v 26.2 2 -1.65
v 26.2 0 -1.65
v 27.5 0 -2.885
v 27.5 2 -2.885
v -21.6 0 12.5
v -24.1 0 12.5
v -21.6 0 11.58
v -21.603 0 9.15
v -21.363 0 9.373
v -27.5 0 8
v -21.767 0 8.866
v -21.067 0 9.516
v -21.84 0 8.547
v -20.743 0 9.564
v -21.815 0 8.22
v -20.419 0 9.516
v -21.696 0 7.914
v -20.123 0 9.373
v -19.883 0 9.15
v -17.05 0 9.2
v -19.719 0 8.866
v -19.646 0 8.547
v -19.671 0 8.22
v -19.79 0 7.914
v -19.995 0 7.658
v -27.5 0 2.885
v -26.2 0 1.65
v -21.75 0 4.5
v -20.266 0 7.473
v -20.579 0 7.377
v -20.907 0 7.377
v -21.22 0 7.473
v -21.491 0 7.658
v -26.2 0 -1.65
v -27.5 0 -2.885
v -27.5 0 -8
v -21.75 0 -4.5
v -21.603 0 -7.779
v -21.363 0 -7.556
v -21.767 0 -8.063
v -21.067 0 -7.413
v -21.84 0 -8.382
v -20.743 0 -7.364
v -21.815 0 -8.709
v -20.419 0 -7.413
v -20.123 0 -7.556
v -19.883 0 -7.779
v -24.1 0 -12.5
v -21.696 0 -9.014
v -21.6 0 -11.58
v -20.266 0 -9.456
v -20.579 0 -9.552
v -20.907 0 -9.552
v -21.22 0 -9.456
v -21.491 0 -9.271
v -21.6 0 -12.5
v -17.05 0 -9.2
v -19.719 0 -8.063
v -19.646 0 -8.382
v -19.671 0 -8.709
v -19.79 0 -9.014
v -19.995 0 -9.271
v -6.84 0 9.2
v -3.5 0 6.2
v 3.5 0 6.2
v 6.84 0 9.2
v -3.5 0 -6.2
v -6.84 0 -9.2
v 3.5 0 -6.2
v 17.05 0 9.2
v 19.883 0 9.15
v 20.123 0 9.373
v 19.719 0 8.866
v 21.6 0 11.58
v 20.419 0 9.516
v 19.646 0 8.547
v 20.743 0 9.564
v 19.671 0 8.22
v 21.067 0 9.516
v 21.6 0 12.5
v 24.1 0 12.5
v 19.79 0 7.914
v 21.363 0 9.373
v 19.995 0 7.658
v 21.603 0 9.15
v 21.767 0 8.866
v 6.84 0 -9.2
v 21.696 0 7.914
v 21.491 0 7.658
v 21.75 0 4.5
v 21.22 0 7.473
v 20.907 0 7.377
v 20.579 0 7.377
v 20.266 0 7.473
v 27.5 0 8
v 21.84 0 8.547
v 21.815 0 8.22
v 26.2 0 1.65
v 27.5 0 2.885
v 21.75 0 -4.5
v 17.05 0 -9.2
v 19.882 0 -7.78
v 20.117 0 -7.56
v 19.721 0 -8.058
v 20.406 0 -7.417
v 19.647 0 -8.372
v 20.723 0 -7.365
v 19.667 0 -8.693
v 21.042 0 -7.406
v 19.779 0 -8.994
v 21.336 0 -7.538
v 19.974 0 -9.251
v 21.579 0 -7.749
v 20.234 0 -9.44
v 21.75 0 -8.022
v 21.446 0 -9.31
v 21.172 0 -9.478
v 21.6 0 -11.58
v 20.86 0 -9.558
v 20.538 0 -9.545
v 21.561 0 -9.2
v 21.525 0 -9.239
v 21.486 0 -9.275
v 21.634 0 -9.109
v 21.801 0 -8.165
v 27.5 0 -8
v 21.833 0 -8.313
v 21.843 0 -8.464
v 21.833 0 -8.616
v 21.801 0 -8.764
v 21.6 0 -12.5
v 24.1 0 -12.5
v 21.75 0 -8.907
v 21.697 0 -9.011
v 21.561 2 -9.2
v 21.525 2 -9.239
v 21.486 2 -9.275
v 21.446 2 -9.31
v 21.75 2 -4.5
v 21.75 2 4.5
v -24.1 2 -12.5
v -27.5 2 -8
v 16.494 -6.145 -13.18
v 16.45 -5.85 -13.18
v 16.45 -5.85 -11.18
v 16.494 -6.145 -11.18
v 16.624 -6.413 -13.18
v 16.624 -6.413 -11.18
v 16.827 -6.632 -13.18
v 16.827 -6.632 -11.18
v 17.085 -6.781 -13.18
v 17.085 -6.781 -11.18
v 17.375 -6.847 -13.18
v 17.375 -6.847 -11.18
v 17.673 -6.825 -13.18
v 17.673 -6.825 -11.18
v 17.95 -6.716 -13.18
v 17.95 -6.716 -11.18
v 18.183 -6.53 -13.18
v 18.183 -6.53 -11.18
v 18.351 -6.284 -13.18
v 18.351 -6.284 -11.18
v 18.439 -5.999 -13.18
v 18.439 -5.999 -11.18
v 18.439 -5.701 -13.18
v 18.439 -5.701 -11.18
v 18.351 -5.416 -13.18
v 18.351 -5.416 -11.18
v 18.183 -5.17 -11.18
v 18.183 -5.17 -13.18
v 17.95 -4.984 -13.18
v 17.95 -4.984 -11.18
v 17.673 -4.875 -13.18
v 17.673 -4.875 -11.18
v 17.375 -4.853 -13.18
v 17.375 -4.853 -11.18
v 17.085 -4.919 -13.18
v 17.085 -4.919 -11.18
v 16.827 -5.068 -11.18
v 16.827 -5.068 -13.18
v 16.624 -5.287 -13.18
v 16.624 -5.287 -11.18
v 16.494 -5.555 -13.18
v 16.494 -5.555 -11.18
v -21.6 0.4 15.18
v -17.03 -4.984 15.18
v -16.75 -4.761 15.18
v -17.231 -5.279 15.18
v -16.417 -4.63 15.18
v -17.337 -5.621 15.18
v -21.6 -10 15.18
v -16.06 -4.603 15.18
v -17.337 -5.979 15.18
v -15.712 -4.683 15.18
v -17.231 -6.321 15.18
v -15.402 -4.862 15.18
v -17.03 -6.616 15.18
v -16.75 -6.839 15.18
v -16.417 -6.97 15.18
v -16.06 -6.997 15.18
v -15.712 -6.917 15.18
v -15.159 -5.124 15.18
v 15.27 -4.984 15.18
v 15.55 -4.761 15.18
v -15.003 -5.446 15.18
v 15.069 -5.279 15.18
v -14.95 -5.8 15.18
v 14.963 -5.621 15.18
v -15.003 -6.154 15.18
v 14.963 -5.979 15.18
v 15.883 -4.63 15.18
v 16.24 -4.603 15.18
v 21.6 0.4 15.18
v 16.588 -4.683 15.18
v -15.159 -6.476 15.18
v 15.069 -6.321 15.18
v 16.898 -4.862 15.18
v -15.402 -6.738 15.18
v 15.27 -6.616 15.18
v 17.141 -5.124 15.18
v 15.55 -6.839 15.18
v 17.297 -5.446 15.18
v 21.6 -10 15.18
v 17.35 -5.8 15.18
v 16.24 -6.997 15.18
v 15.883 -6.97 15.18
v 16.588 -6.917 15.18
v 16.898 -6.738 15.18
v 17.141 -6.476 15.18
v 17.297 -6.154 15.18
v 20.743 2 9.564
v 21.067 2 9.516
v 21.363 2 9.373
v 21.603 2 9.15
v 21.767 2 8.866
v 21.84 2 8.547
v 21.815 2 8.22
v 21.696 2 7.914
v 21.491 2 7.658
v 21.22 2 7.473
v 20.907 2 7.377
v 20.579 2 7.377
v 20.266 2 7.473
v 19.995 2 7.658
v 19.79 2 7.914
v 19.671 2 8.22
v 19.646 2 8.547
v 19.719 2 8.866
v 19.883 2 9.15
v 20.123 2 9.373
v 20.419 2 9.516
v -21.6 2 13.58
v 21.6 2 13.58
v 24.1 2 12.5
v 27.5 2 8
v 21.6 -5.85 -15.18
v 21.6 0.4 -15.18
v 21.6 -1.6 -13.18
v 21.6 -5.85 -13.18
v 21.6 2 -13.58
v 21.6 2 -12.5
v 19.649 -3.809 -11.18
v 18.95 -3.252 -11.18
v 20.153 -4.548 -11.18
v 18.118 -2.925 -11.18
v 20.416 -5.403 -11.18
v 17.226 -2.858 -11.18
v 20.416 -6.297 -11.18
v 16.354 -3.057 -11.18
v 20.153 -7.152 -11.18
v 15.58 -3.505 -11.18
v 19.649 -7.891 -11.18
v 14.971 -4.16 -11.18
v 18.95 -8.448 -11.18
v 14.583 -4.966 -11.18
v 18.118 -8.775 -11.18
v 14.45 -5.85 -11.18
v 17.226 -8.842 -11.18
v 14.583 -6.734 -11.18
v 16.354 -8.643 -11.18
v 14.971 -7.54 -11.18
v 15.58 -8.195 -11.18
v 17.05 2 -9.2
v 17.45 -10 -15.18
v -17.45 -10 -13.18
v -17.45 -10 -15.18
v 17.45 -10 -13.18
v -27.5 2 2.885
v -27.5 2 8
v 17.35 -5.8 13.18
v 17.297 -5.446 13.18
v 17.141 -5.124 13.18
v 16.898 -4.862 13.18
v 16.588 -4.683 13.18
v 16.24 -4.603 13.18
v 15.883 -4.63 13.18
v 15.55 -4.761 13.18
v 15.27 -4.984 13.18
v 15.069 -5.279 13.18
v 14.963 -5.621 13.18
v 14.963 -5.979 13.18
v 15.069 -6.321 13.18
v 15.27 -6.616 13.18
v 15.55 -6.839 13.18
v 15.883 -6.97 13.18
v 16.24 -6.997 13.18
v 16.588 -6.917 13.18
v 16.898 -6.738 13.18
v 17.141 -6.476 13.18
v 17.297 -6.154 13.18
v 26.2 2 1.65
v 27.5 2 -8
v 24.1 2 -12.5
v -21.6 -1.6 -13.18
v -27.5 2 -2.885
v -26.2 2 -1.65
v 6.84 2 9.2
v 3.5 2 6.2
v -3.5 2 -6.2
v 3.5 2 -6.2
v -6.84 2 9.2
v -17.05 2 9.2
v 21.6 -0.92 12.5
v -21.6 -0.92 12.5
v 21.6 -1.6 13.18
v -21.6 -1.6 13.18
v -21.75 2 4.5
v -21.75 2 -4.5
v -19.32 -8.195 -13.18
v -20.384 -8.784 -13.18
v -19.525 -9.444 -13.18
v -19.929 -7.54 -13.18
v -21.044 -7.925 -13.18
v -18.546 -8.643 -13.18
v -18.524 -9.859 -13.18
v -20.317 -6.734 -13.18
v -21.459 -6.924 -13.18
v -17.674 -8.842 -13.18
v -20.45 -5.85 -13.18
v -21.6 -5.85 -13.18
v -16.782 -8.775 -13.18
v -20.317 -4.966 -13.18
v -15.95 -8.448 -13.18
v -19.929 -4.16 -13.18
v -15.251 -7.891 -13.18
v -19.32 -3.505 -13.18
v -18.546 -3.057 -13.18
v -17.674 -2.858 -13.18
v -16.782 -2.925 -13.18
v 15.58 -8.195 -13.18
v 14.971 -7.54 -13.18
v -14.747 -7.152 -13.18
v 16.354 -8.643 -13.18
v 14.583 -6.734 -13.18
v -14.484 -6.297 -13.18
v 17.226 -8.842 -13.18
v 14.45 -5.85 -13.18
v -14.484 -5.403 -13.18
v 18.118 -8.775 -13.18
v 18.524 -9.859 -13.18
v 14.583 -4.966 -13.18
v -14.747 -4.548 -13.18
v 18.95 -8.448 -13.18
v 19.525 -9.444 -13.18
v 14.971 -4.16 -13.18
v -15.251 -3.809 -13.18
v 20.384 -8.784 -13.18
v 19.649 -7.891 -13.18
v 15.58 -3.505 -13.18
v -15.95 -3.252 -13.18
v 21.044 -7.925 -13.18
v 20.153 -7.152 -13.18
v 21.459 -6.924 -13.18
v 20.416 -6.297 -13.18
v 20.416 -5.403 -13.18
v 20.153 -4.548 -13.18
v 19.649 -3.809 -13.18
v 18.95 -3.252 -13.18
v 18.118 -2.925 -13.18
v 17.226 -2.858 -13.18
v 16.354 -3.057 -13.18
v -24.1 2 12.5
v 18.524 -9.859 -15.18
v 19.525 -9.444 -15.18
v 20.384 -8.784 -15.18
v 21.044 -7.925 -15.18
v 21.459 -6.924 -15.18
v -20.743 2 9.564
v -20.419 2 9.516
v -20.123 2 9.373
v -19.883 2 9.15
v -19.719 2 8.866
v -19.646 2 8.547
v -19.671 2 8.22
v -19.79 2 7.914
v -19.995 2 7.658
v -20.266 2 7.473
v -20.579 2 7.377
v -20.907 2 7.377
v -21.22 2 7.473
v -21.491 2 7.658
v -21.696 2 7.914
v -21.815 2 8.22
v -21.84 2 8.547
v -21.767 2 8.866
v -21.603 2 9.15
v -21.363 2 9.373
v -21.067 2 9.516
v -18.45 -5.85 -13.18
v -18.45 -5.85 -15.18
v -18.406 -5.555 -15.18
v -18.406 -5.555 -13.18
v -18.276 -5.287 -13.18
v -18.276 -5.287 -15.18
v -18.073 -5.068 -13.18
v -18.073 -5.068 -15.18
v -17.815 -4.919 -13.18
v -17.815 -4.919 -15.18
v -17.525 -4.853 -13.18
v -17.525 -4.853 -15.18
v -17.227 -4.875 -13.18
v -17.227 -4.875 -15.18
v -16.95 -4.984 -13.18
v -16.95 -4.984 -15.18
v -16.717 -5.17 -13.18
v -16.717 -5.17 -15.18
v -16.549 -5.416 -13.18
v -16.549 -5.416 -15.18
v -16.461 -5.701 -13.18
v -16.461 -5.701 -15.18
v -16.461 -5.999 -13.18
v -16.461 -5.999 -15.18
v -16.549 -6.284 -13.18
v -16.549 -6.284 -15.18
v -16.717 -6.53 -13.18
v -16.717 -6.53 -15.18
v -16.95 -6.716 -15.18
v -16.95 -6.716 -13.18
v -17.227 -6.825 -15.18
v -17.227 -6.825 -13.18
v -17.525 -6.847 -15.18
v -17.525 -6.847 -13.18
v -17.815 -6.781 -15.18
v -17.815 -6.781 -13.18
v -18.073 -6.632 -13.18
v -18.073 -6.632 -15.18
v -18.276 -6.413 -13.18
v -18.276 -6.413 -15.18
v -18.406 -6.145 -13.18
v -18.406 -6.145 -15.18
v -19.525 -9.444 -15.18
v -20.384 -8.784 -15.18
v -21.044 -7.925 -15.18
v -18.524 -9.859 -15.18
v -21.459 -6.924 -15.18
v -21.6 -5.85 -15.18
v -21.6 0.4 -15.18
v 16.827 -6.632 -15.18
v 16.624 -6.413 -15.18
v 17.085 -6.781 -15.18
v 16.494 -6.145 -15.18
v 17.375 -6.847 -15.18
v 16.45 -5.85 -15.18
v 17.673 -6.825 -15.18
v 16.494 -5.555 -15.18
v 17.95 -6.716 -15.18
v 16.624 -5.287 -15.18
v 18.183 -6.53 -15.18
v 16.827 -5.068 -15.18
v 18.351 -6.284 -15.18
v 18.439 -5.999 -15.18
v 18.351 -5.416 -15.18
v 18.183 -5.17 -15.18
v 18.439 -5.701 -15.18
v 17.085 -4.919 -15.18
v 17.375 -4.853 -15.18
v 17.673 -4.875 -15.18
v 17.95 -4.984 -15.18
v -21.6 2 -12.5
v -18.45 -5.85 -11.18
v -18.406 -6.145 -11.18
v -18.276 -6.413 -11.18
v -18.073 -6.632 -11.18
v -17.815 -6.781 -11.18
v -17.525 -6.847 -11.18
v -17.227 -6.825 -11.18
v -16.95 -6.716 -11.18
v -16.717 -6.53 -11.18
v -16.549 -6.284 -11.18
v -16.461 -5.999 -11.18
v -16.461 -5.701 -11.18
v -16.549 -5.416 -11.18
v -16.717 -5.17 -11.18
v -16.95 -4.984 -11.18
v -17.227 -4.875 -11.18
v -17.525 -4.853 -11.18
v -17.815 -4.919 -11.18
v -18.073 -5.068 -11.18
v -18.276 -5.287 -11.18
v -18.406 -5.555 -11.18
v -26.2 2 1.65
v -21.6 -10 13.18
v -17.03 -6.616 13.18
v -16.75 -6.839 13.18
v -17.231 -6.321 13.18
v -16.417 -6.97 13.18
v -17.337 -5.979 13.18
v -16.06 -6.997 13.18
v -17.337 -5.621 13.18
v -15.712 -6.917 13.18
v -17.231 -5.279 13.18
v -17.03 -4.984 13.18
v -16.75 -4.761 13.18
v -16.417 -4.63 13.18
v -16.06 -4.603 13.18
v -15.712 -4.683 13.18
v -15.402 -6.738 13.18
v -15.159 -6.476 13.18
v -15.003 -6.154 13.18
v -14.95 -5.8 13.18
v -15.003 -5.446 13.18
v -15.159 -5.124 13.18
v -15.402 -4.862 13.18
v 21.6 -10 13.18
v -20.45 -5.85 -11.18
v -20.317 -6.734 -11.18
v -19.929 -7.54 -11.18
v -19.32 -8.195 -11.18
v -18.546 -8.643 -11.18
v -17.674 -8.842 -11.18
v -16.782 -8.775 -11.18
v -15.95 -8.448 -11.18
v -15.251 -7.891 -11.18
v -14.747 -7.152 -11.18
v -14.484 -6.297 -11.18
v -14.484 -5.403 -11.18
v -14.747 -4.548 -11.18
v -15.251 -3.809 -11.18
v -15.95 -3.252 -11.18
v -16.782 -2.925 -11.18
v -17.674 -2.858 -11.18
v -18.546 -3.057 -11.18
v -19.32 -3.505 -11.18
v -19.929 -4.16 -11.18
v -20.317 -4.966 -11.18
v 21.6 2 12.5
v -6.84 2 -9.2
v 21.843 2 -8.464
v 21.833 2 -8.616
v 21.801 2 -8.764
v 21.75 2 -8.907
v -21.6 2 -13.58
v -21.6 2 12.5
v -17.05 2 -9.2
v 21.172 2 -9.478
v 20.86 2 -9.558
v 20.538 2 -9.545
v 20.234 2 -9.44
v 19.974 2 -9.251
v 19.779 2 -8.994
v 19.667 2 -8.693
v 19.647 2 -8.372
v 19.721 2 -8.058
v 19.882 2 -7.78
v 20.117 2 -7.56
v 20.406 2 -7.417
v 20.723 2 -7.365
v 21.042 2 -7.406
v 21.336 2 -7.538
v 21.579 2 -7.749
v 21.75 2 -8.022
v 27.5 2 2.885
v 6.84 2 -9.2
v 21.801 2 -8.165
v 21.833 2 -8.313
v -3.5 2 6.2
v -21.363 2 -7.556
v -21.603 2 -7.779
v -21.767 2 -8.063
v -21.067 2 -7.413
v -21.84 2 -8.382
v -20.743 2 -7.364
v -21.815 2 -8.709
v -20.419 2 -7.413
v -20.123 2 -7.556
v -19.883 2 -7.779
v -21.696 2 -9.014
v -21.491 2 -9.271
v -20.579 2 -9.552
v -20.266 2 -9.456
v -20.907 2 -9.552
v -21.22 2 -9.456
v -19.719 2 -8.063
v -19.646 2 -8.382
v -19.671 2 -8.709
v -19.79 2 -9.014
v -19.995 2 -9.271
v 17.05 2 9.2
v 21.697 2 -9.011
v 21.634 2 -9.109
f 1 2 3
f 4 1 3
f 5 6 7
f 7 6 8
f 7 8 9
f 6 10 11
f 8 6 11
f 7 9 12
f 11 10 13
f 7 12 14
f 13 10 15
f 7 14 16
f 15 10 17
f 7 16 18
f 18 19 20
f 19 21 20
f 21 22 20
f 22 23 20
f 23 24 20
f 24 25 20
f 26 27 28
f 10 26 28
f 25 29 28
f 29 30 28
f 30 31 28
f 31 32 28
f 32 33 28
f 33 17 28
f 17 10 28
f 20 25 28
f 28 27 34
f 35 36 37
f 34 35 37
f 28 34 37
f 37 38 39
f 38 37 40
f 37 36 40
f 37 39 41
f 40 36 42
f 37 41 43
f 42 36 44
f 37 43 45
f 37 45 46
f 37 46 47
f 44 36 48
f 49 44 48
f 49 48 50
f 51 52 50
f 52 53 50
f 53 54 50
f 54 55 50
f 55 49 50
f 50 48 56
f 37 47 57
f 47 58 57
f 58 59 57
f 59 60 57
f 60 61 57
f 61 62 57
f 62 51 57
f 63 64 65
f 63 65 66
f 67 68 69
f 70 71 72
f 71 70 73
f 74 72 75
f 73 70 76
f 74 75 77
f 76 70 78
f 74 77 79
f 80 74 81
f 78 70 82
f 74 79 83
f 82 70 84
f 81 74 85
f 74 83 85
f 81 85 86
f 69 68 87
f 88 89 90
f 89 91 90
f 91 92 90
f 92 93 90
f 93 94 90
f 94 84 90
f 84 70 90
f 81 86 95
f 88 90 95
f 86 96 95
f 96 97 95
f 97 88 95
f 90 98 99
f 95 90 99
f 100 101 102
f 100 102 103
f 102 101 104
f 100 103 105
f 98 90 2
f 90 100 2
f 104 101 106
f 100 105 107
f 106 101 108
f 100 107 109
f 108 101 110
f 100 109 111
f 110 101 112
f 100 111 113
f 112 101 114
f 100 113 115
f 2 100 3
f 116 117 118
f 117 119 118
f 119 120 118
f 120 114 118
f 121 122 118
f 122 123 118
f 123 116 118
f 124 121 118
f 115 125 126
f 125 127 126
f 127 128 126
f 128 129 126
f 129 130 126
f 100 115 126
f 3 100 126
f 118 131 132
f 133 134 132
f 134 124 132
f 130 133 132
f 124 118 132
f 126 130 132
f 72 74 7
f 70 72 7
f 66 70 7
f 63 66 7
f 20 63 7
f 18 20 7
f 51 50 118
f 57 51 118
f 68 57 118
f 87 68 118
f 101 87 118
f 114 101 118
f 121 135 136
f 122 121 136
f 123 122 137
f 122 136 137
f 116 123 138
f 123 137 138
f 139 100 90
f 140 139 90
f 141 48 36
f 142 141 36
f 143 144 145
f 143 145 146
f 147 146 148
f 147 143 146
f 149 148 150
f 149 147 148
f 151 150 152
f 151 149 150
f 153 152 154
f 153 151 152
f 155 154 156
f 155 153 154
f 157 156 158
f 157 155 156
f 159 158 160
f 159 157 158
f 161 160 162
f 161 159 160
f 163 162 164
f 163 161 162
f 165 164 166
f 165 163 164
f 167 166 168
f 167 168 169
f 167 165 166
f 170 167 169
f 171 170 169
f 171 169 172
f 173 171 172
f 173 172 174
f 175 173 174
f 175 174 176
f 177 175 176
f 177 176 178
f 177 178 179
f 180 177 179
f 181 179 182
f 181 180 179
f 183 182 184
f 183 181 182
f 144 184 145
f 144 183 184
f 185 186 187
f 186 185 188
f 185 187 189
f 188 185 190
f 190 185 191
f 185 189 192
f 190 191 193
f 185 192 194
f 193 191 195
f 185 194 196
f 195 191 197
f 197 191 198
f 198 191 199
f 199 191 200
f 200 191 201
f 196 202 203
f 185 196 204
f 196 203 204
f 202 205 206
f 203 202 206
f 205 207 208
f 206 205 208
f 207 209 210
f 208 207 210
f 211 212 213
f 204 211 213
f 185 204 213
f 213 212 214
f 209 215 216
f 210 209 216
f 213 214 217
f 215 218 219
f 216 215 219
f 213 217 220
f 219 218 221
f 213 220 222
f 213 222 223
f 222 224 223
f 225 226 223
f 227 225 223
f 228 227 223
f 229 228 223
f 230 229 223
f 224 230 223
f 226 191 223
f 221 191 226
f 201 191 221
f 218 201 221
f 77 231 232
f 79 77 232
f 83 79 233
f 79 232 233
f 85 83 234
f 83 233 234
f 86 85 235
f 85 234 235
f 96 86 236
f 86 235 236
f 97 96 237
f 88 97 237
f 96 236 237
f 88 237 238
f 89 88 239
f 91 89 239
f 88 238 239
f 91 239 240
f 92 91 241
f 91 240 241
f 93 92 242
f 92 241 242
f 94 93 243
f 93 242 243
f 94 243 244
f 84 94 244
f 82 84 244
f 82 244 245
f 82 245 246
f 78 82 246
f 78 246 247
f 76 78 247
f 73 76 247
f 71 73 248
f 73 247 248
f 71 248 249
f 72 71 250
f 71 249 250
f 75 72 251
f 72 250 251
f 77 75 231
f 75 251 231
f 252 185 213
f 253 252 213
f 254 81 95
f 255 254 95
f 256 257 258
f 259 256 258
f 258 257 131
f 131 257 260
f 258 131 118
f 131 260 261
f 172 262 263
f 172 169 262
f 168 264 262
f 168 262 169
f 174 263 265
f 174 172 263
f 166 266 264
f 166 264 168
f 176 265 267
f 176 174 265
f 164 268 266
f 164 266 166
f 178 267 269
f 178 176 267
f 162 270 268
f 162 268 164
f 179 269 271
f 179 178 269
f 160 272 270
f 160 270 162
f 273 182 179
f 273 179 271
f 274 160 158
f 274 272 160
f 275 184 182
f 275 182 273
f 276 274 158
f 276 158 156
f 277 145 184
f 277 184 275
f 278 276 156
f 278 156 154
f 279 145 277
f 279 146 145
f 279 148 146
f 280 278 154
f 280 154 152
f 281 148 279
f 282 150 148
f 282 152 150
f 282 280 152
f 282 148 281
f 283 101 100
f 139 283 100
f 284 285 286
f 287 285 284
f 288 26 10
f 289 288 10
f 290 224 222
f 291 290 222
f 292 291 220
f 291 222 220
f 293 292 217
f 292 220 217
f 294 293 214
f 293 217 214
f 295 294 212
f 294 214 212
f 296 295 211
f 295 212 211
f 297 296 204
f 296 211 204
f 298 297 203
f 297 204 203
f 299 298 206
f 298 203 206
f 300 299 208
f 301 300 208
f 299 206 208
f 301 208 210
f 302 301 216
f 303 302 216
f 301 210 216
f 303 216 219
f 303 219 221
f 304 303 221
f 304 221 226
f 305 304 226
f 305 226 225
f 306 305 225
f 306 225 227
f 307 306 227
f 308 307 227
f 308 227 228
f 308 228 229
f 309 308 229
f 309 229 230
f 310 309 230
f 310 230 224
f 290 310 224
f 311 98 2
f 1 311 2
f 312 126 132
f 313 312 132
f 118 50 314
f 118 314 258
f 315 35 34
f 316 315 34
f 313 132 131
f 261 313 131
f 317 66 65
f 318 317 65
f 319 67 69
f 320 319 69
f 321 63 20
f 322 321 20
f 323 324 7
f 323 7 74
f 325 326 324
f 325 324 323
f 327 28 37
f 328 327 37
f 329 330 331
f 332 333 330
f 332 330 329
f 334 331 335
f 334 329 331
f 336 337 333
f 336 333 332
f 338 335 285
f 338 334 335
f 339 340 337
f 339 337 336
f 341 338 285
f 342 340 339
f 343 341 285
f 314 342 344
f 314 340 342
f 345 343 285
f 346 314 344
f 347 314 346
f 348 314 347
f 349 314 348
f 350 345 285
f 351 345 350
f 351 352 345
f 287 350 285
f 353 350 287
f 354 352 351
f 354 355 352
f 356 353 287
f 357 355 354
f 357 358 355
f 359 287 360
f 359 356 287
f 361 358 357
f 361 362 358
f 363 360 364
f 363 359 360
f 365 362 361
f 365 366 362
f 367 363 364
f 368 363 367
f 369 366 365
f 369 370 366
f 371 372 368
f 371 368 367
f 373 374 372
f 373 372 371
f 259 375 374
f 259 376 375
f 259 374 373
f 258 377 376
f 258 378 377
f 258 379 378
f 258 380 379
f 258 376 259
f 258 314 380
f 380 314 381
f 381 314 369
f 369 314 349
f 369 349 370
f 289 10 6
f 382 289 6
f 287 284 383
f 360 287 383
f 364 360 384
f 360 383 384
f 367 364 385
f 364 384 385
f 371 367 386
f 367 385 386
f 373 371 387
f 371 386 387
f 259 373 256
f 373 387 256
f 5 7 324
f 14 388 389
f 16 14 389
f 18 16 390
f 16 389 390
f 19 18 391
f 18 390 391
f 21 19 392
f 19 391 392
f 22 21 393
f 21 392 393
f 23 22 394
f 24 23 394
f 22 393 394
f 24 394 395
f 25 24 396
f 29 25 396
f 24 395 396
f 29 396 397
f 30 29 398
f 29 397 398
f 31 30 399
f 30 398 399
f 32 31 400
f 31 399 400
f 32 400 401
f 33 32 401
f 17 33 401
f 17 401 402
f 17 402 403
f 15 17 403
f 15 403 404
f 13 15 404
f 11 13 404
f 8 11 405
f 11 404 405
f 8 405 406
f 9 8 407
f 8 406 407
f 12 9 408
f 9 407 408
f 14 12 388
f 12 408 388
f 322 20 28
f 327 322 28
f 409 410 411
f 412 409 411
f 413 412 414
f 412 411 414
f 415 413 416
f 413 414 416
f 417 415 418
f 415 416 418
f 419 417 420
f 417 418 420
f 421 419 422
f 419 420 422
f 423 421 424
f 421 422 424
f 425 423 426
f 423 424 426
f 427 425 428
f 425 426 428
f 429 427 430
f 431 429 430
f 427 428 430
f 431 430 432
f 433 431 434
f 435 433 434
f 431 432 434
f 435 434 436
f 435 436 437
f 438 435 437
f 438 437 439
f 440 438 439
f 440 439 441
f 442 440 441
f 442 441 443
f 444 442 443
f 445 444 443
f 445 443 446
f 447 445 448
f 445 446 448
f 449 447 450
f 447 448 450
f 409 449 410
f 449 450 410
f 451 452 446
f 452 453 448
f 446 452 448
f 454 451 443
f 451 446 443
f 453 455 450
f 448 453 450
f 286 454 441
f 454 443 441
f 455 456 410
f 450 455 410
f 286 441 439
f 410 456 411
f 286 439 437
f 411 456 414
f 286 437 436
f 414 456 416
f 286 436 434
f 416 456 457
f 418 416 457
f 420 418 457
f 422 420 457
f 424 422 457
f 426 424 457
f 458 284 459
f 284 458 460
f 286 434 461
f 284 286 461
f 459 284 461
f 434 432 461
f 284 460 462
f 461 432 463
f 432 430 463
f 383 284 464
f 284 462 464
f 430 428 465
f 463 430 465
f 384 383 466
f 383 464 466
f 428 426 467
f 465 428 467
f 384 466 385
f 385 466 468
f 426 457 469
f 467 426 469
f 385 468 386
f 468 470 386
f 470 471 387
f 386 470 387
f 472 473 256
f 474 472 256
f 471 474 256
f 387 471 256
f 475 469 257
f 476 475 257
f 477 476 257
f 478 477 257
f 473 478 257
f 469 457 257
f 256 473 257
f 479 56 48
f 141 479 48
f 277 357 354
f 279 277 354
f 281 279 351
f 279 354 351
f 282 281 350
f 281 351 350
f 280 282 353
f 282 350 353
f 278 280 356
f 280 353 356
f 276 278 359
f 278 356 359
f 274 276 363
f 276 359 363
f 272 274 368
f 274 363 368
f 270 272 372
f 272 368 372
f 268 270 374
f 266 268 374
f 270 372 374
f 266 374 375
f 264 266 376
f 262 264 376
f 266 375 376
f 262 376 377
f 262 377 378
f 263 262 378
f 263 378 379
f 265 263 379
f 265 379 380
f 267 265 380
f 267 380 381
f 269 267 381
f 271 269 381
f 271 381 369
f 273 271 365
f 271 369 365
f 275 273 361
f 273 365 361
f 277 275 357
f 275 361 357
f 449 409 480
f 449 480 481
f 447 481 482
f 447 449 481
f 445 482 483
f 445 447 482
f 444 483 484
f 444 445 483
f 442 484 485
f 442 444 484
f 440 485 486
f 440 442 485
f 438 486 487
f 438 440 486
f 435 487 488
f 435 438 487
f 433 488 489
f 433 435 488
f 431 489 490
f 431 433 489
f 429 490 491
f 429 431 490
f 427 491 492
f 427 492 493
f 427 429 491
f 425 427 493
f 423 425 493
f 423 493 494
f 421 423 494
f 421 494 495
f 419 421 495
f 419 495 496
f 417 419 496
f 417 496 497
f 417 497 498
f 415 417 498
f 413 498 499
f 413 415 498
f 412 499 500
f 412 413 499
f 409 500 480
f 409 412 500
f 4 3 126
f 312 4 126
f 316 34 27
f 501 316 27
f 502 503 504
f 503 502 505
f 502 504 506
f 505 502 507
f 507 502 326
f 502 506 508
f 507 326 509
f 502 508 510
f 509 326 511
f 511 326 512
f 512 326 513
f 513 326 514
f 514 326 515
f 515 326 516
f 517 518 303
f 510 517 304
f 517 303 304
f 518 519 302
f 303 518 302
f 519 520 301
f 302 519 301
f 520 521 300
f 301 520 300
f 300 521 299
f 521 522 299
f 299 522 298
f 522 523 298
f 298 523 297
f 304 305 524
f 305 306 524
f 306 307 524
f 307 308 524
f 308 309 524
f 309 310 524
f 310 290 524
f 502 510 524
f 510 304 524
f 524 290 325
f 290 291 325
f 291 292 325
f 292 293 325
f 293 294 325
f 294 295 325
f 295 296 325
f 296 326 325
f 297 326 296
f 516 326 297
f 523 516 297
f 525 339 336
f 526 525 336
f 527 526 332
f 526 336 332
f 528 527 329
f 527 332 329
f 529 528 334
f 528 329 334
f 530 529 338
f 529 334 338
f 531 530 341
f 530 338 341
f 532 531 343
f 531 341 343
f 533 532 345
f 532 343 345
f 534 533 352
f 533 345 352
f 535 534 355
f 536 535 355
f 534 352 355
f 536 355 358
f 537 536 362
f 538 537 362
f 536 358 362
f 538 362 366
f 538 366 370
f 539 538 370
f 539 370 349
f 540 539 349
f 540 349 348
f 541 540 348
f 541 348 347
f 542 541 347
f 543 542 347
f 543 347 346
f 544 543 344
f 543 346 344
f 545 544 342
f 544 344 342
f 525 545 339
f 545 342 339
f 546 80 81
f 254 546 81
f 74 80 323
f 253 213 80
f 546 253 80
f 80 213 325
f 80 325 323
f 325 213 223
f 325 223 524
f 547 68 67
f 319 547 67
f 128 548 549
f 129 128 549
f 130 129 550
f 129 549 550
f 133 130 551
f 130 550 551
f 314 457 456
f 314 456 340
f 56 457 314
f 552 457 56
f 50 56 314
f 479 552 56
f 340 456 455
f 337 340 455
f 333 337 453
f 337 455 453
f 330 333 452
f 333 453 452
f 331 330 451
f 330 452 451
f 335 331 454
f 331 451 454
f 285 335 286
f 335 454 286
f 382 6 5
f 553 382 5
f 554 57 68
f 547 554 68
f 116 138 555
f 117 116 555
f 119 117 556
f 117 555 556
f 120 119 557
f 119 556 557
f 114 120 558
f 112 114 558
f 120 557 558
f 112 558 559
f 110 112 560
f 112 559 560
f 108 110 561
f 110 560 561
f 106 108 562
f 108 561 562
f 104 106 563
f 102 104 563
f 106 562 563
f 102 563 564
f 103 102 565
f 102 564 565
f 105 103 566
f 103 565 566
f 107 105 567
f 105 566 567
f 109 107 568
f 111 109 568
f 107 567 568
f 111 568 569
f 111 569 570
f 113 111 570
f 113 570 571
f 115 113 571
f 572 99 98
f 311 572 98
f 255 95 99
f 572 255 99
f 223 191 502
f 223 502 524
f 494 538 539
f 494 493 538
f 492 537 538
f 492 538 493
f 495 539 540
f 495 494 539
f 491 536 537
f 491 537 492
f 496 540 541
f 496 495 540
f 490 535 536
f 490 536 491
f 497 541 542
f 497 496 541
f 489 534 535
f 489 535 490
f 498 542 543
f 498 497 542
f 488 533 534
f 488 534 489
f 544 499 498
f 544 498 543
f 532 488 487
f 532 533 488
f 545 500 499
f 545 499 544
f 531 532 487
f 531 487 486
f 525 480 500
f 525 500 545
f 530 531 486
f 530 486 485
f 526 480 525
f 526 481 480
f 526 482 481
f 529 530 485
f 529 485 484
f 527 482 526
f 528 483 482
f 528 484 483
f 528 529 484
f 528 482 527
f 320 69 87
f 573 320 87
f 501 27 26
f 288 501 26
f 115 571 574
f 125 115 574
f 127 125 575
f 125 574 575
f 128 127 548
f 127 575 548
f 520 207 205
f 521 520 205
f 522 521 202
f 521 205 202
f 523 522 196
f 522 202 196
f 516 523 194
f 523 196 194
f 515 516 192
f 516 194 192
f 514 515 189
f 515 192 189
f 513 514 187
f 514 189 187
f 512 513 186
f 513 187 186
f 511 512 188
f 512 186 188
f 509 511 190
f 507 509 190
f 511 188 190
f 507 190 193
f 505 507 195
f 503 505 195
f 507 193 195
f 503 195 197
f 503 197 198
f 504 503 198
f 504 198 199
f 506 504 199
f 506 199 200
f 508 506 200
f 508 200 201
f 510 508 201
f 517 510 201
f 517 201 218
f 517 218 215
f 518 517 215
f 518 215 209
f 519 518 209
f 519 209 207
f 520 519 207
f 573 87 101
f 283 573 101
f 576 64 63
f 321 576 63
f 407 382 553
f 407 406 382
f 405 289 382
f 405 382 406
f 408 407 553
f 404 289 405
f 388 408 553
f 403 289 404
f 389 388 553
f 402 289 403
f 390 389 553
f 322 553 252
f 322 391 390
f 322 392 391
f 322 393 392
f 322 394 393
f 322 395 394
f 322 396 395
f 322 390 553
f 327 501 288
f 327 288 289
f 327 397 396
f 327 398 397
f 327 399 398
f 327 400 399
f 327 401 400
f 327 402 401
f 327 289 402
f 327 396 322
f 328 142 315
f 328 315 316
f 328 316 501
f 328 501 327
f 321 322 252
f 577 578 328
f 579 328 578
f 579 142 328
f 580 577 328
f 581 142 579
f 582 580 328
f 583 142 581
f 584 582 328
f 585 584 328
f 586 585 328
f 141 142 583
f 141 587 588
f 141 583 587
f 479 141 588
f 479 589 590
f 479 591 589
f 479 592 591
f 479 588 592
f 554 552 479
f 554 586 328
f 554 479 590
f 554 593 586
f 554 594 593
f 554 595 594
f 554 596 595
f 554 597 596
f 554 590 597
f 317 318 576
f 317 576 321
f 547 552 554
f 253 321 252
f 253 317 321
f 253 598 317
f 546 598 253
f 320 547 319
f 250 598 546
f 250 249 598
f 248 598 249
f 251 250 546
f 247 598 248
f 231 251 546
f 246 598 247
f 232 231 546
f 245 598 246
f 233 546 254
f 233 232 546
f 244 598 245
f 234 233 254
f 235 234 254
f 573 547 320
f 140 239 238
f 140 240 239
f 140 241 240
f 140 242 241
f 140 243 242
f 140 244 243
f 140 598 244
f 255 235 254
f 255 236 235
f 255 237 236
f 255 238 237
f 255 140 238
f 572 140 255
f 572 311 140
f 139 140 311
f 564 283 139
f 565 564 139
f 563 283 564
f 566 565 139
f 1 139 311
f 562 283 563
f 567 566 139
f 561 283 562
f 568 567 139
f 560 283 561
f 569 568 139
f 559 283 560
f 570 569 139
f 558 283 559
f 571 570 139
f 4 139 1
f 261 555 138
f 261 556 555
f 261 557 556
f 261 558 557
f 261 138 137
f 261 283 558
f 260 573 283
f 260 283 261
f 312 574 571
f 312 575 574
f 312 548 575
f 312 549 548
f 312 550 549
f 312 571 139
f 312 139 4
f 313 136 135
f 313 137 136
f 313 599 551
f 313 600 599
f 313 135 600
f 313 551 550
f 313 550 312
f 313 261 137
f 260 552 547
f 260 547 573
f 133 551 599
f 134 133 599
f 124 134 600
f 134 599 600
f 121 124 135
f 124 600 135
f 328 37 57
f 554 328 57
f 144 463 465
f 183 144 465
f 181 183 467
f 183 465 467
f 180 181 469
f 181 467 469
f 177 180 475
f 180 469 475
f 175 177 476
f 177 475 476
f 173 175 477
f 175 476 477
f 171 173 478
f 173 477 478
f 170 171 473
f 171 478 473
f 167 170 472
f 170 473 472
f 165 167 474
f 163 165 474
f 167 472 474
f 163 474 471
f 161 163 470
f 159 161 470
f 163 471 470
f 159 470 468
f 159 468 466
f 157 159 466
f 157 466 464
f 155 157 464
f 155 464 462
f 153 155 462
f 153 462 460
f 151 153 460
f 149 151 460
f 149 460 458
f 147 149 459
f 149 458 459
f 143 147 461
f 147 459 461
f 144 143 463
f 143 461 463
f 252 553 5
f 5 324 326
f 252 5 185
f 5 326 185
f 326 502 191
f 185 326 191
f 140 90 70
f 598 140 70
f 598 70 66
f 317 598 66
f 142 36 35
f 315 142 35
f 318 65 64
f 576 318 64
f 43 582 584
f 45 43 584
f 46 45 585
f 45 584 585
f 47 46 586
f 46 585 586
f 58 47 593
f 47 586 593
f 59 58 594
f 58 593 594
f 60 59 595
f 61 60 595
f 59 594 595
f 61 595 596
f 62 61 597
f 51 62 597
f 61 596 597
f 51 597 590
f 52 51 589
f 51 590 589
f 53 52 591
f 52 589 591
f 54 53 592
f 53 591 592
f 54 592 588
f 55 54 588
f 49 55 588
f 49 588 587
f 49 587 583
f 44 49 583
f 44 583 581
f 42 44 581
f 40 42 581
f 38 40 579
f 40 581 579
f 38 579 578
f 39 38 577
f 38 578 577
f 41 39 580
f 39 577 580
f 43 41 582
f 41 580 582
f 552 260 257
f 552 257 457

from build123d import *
from build123d.topology import SkipClean

# Parameters (mm, degrees)
EXTRUDE_1_DEPTH     = 2
SKETCH_2_R          = 1.1
CUT_EXTRUDE_1_DEPTH = 2
SKETCH_3_W          = 43.2
SKETCH_3_H          = 2
EXTRUDE_2_DEPTH     = 10
SKETCH_4_R          = 1
CUT_EXTRUDE_2_DEPTH = 2
SKETCH_5_R          = 3
SKETCH_5_R_2        = 1
EXTRUDE_3_DEPTH     = 2
CHAMFER_2_SIZE      = 1.6
CUT_EXTRUDE_3_DEPTH = 5.9
CUT_EXTRUDE_4_DEPTH = 5.9
SKETCH_9_R          = 1.2
CUT_EXTRUDE_5_DEPTH = 10
CUT_EXTRUDE_7_DEPTH = 10


with BuildPart() as part:
    # 草图1 → 凸台-拉伸1 (new body)
    with BuildSketch(Plane(origin=(0, 0, 0), x_dir=(1, 0, 0), z_dir=(0, 1, 0))):
        Polygon((24.1, -12.5), (27.5, -8), (27.5, -2.885), (26.2, -1.65), (26.2, 1.65), (27.5, 2.885), (27.5, 8), (24.1, 12.5), (21.6, 12.5), (21.6, 15.18), (-21.6, 15.18), (-21.6, 12.5), (-24.1, 12.5), (-27.5, 8), (-27.5, 2.885), (-26.2, 1.65), (-26.2, -1.65), (-27.5, -2.885), (-27.5, -8), (-24.1, -12.5), (-21.6, -12.5), (-21.6, -15.18), (21.6, -15.18), (21.6, -12.5), align=None)
        Polygon((17.05, -9.2), (6.84, -9.2), (3.5, -6.2), (-3.5, -6.2), (-6.84, -9.2), (-17.05, -9.2), (-21.75, -4.5), (-21.75, 4.5), (-17.05, 9.2), (-6.84, 9.2), (-3.5, 6.2), (3.5, 6.2), (6.84, 9.2), (17.05, 9.2), (21.75, 4.5), (21.75, -4.5), align=None, mode=Mode.SUBTRACT)
    extrude(amount=EXTRUDE_1_DEPTH)

    # 草图2 → 切除-拉伸1 (cut)
    with BuildSketch(Plane(origin=(0, 2, 0), x_dir=(1, 0, 0), z_dir=(0, 1, 0))):
        with Locations(Location((20.742981447, -8.464435144, 0), (0, 0, 270))):
            Circle(SKETCH_2_R)
        with Locations(Location((-20.742981447, 8.464435144, 0), (0, 0, 270))):
            Circle(SKETCH_2_R)
        with BuildLine():
            Line((21.75, 8.021813823), (21.75, 8.907056465))
            ThreePointArc((21.75, 8.907056465), (21.667117231, 9.061069917), (21.560871624, 9.2))
            Line((21.560871624, 9.2), (21.354867257, 9.2))
            Line((21.354867257, 9.2), (21.446447919, 9.310091648))
            ThreePointArc((21.446447919, 9.310091648), (19.672301899, 8.21215493), (21.75, 8.021813823))
        make_face()
        with Locations(Location((-20.742981447, -8.464435144, 0), (0, 0, 270))):
            Circle(SKETCH_2_R)
    extrude(amount=-CUT_EXTRUDE_1_DEPTH, mode=Mode.SUBTRACT)

    # 草图3 → 凸台-拉伸2 (add)
    with BuildSketch(Plane.XZ):
        with Locations((0, -14.18)):
            Rectangle(SKETCH_3_W, SKETCH_3_H)
        with Locations((0, 14.18)):
            Rectangle(SKETCH_3_W, SKETCH_3_H)
    extrude(amount=EXTRUDE_2_DEPTH)

    # 草图4 → 切除-拉伸2 (cut)
    with BuildSketch(Plane(origin=(0, 0, -15.18), x_dir=(-1, 0, 0), z_dir=(0, 0, -1))):
        with Locations((-17.45, -5.85)):
            Circle(SKETCH_4_R)
        with BuildLine():
            ThreePointArc((-17.45, -10), (-20.384493142, -8.784493142), (-21.6, -5.85))
            Line((-21.6, -5.85), (-21.6, -10))
            Line((-21.6, -10), (-17.45, -10))
        make_face()
        with Locations((17.45, -5.85)):
            Circle(SKETCH_4_R)
        with BuildLine():
            Line((21.6, -10), (21.6, -5.85))
            ThreePointArc((21.6, -5.85), (20.384493142, -8.784493142), (17.45, -10))
            Line((17.45, -10), (21.6, -10))
        make_face()
    extrude(amount=-CUT_EXTRUDE_2_DEPTH, mode=Mode.SUBTRACT)

    # 草图5 → 凸台-拉伸3 (add)
    # profile 1 of 2: a face of its own
    with BuildSketch(Plane.XY.offset(-13.18)):
        with Locations(Location((17.45, -5.85, 0), (0, 0, 180))):
            Circle(SKETCH_5_R)
        with Locations(Location((17.45, -5.85, 0), (0, 0, 180))):
            Circle(SKETCH_5_R_2, mode=Mode.SUBTRACT)
    # profile 2 of 2: a face of its own
    with BuildSketch(Plane.XY.offset(-13.18)):
        with Locations(Location((-17.45, -5.85, 0), (0, 0, 180))):
            Circle(SKETCH_5_R)
        with Locations(Location((-17.45, -5.85, 0), (0, 0, 180))):
            Circle(SKETCH_5_R_2, mode=Mode.SUBTRACT)
    extrude(amount=EXTRUDE_3_DEPTH)

    # 倒角2
    chamfer_2_edges = [part.edges().sort_by_distance(p)[0] for p in [
        (0, 2, 15.18),
        (0, 0, 13.18),
        (0, 0, -13.18),
        (0, 2, -15.18),
    ]]
    chamfer(chamfer_2_edges, length=CHAMFER_2_SIZE)

    # 草图7 → 切除-拉伸3 (cut)
    with BuildSketch(Plane(origin=(21.6, 0, 0), x_dir=(0, 0, -1), z_dir=(1, 0, 0))):
        Polygon((-12.5, -0.92), (-11.58, 0), (-12.5, 0), align=None)
        Polygon((12.5, 0), (11.58, 0), (12.5, -0.92), align=None)
    extrude(amount=CUT_EXTRUDE_3_DEPTH, mode=Mode.SUBTRACT)

    # 草图8 → 切除-拉伸4 (cut)
    with BuildSketch(Plane.ZY.offset(27.5)):
        Polygon((12.5, 0), (11.58, 0), (12.5, -0.92), align=None)
        Polygon((-12.5, -0.92), (-11.58, 0), (-12.5, 0), align=None)
    extrude(amount=-CUT_EXTRUDE_4_DEPTH, mode=Mode.SUBTRACT)

    # 草图9 → 切除-拉伸5 (cut)
    with BuildSketch(Plane.XY.offset(15.18)):
        with Locations((-16.15, -5.8)):
            Circle(SKETCH_9_R)
        with Locations((16.15, -5.8)):
            Circle(SKETCH_9_R)
    extrude(amount=-CUT_EXTRUDE_5_DEPTH, mode=Mode.SUBTRACT)

    # 草图11 → 切除-拉伸7 (cut)
    with SkipClean():  # the faces are left unmerged after this step: merging them gives an invalid solid
        with BuildSketch(Plane(origin=(0, 2, 0), x_dir=(1, 0, 0), z_dir=(0, 1, 0))):
            with BuildLine():
                Line((21.446447919, 9.310091648), (21.354867257, 9.2))
                Line((21.354867257, 9.2), (21.560871624, 9.2))
                ThreePointArc((21.560871624, 9.2), (21.667117231, 9.061069917), (21.75, 8.907056465))
                Line((21.75, 8.907056465), (21.75, 8.021813823))
                ThreePointArc((21.75, 8.021813823), (19.672301899, 8.21215493), (21.446447919, 9.310091648))
            make_face()
            with BuildLine():
                Line((21.75, 8.907056465), (21.75, 8.021813823))
                ThreePointArc((21.75, 8.021813823), (21.819485141, 8.238294047), (21.842981447, 8.464435144))
                ThreePointArc((21.842981447, 8.464435144), (21.819485141, 8.690576241), (21.75, 8.907056465))
            make_face()
            with BuildLine():
                ThreePointArc((21.560871624, 9.2), (21.505648843, 9.257113164), (21.446447919, 9.310091648))
                Line((21.446447919, 9.310091648), (21.354867257, 9.2))
                Line((21.354867257, 9.2), (21.560871624, 9.2))
            make_face()
        extrude(amount=-CUT_EXTRUDE_7_DEPTH, mode=Mode.SUBTRACT)


solid = part.part
